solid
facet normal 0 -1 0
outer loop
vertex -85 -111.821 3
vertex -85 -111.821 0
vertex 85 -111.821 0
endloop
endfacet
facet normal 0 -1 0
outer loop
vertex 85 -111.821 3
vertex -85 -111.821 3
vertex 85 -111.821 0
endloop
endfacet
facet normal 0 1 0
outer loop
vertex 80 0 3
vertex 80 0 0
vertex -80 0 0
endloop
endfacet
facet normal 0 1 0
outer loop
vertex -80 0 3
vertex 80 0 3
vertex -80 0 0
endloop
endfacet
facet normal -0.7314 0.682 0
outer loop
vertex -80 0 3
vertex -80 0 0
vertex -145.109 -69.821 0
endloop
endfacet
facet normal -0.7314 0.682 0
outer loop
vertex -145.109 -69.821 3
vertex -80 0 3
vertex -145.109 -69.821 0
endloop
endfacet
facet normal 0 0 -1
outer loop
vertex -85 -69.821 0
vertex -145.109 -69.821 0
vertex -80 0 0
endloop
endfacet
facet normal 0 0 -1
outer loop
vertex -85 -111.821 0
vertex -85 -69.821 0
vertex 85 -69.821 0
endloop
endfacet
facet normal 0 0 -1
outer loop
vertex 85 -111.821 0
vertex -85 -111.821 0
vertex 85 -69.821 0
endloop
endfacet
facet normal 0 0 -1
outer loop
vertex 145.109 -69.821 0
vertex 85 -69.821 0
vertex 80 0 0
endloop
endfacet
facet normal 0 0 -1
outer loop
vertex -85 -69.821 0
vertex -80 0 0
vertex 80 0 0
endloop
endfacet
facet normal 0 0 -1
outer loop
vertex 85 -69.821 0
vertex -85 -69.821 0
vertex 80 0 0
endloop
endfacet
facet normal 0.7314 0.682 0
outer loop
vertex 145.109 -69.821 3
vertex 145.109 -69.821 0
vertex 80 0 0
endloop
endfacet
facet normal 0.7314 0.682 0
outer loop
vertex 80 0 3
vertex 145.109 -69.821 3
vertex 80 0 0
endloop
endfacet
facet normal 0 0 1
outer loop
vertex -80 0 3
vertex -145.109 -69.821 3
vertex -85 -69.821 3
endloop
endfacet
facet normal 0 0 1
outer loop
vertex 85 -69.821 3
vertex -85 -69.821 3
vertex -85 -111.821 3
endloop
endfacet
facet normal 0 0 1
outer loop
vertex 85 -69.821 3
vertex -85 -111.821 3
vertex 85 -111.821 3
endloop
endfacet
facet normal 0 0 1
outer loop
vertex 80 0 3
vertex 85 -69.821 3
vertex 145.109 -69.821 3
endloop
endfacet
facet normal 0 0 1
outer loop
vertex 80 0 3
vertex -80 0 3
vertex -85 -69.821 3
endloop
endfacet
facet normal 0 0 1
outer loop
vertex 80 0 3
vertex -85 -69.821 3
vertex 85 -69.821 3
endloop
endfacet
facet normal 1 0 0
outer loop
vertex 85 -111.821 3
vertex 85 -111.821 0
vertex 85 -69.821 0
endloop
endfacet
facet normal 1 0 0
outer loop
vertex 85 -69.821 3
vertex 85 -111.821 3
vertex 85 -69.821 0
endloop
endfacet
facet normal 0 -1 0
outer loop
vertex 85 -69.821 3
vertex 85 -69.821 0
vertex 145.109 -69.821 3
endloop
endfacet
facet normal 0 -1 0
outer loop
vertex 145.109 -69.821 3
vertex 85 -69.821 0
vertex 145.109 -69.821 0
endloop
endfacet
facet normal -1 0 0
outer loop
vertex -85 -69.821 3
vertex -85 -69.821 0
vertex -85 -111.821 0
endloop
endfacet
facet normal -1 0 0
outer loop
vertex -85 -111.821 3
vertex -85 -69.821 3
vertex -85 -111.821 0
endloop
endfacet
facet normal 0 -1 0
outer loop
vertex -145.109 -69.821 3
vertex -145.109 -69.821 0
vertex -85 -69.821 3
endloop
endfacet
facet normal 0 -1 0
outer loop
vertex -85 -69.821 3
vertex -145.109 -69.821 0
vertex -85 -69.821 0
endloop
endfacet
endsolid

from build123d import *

# Parameters (mm, degrees)
EXTRUDE_1_DEPTH = 3


with BuildPart() as part:
    # 草图1 → 凸台-拉伸1 (new body)
    with BuildSketch(Plane.XY):
        Polygon((0, 0), (-80, 0), (-145.109322536, -69.821200219), (-85, -69.821200219), (-85, -111.821200219), (0, -111.821200219), align=None)
        Polygon((80, 0), (0, 0), (0, -111.821200219), (85, -111.821200219), (85, -69.821200219), (145.109322536, -69.821200219), align=None)
    extrude(amount=EXTRUDE_1_DEPTH)


solid = part.part
